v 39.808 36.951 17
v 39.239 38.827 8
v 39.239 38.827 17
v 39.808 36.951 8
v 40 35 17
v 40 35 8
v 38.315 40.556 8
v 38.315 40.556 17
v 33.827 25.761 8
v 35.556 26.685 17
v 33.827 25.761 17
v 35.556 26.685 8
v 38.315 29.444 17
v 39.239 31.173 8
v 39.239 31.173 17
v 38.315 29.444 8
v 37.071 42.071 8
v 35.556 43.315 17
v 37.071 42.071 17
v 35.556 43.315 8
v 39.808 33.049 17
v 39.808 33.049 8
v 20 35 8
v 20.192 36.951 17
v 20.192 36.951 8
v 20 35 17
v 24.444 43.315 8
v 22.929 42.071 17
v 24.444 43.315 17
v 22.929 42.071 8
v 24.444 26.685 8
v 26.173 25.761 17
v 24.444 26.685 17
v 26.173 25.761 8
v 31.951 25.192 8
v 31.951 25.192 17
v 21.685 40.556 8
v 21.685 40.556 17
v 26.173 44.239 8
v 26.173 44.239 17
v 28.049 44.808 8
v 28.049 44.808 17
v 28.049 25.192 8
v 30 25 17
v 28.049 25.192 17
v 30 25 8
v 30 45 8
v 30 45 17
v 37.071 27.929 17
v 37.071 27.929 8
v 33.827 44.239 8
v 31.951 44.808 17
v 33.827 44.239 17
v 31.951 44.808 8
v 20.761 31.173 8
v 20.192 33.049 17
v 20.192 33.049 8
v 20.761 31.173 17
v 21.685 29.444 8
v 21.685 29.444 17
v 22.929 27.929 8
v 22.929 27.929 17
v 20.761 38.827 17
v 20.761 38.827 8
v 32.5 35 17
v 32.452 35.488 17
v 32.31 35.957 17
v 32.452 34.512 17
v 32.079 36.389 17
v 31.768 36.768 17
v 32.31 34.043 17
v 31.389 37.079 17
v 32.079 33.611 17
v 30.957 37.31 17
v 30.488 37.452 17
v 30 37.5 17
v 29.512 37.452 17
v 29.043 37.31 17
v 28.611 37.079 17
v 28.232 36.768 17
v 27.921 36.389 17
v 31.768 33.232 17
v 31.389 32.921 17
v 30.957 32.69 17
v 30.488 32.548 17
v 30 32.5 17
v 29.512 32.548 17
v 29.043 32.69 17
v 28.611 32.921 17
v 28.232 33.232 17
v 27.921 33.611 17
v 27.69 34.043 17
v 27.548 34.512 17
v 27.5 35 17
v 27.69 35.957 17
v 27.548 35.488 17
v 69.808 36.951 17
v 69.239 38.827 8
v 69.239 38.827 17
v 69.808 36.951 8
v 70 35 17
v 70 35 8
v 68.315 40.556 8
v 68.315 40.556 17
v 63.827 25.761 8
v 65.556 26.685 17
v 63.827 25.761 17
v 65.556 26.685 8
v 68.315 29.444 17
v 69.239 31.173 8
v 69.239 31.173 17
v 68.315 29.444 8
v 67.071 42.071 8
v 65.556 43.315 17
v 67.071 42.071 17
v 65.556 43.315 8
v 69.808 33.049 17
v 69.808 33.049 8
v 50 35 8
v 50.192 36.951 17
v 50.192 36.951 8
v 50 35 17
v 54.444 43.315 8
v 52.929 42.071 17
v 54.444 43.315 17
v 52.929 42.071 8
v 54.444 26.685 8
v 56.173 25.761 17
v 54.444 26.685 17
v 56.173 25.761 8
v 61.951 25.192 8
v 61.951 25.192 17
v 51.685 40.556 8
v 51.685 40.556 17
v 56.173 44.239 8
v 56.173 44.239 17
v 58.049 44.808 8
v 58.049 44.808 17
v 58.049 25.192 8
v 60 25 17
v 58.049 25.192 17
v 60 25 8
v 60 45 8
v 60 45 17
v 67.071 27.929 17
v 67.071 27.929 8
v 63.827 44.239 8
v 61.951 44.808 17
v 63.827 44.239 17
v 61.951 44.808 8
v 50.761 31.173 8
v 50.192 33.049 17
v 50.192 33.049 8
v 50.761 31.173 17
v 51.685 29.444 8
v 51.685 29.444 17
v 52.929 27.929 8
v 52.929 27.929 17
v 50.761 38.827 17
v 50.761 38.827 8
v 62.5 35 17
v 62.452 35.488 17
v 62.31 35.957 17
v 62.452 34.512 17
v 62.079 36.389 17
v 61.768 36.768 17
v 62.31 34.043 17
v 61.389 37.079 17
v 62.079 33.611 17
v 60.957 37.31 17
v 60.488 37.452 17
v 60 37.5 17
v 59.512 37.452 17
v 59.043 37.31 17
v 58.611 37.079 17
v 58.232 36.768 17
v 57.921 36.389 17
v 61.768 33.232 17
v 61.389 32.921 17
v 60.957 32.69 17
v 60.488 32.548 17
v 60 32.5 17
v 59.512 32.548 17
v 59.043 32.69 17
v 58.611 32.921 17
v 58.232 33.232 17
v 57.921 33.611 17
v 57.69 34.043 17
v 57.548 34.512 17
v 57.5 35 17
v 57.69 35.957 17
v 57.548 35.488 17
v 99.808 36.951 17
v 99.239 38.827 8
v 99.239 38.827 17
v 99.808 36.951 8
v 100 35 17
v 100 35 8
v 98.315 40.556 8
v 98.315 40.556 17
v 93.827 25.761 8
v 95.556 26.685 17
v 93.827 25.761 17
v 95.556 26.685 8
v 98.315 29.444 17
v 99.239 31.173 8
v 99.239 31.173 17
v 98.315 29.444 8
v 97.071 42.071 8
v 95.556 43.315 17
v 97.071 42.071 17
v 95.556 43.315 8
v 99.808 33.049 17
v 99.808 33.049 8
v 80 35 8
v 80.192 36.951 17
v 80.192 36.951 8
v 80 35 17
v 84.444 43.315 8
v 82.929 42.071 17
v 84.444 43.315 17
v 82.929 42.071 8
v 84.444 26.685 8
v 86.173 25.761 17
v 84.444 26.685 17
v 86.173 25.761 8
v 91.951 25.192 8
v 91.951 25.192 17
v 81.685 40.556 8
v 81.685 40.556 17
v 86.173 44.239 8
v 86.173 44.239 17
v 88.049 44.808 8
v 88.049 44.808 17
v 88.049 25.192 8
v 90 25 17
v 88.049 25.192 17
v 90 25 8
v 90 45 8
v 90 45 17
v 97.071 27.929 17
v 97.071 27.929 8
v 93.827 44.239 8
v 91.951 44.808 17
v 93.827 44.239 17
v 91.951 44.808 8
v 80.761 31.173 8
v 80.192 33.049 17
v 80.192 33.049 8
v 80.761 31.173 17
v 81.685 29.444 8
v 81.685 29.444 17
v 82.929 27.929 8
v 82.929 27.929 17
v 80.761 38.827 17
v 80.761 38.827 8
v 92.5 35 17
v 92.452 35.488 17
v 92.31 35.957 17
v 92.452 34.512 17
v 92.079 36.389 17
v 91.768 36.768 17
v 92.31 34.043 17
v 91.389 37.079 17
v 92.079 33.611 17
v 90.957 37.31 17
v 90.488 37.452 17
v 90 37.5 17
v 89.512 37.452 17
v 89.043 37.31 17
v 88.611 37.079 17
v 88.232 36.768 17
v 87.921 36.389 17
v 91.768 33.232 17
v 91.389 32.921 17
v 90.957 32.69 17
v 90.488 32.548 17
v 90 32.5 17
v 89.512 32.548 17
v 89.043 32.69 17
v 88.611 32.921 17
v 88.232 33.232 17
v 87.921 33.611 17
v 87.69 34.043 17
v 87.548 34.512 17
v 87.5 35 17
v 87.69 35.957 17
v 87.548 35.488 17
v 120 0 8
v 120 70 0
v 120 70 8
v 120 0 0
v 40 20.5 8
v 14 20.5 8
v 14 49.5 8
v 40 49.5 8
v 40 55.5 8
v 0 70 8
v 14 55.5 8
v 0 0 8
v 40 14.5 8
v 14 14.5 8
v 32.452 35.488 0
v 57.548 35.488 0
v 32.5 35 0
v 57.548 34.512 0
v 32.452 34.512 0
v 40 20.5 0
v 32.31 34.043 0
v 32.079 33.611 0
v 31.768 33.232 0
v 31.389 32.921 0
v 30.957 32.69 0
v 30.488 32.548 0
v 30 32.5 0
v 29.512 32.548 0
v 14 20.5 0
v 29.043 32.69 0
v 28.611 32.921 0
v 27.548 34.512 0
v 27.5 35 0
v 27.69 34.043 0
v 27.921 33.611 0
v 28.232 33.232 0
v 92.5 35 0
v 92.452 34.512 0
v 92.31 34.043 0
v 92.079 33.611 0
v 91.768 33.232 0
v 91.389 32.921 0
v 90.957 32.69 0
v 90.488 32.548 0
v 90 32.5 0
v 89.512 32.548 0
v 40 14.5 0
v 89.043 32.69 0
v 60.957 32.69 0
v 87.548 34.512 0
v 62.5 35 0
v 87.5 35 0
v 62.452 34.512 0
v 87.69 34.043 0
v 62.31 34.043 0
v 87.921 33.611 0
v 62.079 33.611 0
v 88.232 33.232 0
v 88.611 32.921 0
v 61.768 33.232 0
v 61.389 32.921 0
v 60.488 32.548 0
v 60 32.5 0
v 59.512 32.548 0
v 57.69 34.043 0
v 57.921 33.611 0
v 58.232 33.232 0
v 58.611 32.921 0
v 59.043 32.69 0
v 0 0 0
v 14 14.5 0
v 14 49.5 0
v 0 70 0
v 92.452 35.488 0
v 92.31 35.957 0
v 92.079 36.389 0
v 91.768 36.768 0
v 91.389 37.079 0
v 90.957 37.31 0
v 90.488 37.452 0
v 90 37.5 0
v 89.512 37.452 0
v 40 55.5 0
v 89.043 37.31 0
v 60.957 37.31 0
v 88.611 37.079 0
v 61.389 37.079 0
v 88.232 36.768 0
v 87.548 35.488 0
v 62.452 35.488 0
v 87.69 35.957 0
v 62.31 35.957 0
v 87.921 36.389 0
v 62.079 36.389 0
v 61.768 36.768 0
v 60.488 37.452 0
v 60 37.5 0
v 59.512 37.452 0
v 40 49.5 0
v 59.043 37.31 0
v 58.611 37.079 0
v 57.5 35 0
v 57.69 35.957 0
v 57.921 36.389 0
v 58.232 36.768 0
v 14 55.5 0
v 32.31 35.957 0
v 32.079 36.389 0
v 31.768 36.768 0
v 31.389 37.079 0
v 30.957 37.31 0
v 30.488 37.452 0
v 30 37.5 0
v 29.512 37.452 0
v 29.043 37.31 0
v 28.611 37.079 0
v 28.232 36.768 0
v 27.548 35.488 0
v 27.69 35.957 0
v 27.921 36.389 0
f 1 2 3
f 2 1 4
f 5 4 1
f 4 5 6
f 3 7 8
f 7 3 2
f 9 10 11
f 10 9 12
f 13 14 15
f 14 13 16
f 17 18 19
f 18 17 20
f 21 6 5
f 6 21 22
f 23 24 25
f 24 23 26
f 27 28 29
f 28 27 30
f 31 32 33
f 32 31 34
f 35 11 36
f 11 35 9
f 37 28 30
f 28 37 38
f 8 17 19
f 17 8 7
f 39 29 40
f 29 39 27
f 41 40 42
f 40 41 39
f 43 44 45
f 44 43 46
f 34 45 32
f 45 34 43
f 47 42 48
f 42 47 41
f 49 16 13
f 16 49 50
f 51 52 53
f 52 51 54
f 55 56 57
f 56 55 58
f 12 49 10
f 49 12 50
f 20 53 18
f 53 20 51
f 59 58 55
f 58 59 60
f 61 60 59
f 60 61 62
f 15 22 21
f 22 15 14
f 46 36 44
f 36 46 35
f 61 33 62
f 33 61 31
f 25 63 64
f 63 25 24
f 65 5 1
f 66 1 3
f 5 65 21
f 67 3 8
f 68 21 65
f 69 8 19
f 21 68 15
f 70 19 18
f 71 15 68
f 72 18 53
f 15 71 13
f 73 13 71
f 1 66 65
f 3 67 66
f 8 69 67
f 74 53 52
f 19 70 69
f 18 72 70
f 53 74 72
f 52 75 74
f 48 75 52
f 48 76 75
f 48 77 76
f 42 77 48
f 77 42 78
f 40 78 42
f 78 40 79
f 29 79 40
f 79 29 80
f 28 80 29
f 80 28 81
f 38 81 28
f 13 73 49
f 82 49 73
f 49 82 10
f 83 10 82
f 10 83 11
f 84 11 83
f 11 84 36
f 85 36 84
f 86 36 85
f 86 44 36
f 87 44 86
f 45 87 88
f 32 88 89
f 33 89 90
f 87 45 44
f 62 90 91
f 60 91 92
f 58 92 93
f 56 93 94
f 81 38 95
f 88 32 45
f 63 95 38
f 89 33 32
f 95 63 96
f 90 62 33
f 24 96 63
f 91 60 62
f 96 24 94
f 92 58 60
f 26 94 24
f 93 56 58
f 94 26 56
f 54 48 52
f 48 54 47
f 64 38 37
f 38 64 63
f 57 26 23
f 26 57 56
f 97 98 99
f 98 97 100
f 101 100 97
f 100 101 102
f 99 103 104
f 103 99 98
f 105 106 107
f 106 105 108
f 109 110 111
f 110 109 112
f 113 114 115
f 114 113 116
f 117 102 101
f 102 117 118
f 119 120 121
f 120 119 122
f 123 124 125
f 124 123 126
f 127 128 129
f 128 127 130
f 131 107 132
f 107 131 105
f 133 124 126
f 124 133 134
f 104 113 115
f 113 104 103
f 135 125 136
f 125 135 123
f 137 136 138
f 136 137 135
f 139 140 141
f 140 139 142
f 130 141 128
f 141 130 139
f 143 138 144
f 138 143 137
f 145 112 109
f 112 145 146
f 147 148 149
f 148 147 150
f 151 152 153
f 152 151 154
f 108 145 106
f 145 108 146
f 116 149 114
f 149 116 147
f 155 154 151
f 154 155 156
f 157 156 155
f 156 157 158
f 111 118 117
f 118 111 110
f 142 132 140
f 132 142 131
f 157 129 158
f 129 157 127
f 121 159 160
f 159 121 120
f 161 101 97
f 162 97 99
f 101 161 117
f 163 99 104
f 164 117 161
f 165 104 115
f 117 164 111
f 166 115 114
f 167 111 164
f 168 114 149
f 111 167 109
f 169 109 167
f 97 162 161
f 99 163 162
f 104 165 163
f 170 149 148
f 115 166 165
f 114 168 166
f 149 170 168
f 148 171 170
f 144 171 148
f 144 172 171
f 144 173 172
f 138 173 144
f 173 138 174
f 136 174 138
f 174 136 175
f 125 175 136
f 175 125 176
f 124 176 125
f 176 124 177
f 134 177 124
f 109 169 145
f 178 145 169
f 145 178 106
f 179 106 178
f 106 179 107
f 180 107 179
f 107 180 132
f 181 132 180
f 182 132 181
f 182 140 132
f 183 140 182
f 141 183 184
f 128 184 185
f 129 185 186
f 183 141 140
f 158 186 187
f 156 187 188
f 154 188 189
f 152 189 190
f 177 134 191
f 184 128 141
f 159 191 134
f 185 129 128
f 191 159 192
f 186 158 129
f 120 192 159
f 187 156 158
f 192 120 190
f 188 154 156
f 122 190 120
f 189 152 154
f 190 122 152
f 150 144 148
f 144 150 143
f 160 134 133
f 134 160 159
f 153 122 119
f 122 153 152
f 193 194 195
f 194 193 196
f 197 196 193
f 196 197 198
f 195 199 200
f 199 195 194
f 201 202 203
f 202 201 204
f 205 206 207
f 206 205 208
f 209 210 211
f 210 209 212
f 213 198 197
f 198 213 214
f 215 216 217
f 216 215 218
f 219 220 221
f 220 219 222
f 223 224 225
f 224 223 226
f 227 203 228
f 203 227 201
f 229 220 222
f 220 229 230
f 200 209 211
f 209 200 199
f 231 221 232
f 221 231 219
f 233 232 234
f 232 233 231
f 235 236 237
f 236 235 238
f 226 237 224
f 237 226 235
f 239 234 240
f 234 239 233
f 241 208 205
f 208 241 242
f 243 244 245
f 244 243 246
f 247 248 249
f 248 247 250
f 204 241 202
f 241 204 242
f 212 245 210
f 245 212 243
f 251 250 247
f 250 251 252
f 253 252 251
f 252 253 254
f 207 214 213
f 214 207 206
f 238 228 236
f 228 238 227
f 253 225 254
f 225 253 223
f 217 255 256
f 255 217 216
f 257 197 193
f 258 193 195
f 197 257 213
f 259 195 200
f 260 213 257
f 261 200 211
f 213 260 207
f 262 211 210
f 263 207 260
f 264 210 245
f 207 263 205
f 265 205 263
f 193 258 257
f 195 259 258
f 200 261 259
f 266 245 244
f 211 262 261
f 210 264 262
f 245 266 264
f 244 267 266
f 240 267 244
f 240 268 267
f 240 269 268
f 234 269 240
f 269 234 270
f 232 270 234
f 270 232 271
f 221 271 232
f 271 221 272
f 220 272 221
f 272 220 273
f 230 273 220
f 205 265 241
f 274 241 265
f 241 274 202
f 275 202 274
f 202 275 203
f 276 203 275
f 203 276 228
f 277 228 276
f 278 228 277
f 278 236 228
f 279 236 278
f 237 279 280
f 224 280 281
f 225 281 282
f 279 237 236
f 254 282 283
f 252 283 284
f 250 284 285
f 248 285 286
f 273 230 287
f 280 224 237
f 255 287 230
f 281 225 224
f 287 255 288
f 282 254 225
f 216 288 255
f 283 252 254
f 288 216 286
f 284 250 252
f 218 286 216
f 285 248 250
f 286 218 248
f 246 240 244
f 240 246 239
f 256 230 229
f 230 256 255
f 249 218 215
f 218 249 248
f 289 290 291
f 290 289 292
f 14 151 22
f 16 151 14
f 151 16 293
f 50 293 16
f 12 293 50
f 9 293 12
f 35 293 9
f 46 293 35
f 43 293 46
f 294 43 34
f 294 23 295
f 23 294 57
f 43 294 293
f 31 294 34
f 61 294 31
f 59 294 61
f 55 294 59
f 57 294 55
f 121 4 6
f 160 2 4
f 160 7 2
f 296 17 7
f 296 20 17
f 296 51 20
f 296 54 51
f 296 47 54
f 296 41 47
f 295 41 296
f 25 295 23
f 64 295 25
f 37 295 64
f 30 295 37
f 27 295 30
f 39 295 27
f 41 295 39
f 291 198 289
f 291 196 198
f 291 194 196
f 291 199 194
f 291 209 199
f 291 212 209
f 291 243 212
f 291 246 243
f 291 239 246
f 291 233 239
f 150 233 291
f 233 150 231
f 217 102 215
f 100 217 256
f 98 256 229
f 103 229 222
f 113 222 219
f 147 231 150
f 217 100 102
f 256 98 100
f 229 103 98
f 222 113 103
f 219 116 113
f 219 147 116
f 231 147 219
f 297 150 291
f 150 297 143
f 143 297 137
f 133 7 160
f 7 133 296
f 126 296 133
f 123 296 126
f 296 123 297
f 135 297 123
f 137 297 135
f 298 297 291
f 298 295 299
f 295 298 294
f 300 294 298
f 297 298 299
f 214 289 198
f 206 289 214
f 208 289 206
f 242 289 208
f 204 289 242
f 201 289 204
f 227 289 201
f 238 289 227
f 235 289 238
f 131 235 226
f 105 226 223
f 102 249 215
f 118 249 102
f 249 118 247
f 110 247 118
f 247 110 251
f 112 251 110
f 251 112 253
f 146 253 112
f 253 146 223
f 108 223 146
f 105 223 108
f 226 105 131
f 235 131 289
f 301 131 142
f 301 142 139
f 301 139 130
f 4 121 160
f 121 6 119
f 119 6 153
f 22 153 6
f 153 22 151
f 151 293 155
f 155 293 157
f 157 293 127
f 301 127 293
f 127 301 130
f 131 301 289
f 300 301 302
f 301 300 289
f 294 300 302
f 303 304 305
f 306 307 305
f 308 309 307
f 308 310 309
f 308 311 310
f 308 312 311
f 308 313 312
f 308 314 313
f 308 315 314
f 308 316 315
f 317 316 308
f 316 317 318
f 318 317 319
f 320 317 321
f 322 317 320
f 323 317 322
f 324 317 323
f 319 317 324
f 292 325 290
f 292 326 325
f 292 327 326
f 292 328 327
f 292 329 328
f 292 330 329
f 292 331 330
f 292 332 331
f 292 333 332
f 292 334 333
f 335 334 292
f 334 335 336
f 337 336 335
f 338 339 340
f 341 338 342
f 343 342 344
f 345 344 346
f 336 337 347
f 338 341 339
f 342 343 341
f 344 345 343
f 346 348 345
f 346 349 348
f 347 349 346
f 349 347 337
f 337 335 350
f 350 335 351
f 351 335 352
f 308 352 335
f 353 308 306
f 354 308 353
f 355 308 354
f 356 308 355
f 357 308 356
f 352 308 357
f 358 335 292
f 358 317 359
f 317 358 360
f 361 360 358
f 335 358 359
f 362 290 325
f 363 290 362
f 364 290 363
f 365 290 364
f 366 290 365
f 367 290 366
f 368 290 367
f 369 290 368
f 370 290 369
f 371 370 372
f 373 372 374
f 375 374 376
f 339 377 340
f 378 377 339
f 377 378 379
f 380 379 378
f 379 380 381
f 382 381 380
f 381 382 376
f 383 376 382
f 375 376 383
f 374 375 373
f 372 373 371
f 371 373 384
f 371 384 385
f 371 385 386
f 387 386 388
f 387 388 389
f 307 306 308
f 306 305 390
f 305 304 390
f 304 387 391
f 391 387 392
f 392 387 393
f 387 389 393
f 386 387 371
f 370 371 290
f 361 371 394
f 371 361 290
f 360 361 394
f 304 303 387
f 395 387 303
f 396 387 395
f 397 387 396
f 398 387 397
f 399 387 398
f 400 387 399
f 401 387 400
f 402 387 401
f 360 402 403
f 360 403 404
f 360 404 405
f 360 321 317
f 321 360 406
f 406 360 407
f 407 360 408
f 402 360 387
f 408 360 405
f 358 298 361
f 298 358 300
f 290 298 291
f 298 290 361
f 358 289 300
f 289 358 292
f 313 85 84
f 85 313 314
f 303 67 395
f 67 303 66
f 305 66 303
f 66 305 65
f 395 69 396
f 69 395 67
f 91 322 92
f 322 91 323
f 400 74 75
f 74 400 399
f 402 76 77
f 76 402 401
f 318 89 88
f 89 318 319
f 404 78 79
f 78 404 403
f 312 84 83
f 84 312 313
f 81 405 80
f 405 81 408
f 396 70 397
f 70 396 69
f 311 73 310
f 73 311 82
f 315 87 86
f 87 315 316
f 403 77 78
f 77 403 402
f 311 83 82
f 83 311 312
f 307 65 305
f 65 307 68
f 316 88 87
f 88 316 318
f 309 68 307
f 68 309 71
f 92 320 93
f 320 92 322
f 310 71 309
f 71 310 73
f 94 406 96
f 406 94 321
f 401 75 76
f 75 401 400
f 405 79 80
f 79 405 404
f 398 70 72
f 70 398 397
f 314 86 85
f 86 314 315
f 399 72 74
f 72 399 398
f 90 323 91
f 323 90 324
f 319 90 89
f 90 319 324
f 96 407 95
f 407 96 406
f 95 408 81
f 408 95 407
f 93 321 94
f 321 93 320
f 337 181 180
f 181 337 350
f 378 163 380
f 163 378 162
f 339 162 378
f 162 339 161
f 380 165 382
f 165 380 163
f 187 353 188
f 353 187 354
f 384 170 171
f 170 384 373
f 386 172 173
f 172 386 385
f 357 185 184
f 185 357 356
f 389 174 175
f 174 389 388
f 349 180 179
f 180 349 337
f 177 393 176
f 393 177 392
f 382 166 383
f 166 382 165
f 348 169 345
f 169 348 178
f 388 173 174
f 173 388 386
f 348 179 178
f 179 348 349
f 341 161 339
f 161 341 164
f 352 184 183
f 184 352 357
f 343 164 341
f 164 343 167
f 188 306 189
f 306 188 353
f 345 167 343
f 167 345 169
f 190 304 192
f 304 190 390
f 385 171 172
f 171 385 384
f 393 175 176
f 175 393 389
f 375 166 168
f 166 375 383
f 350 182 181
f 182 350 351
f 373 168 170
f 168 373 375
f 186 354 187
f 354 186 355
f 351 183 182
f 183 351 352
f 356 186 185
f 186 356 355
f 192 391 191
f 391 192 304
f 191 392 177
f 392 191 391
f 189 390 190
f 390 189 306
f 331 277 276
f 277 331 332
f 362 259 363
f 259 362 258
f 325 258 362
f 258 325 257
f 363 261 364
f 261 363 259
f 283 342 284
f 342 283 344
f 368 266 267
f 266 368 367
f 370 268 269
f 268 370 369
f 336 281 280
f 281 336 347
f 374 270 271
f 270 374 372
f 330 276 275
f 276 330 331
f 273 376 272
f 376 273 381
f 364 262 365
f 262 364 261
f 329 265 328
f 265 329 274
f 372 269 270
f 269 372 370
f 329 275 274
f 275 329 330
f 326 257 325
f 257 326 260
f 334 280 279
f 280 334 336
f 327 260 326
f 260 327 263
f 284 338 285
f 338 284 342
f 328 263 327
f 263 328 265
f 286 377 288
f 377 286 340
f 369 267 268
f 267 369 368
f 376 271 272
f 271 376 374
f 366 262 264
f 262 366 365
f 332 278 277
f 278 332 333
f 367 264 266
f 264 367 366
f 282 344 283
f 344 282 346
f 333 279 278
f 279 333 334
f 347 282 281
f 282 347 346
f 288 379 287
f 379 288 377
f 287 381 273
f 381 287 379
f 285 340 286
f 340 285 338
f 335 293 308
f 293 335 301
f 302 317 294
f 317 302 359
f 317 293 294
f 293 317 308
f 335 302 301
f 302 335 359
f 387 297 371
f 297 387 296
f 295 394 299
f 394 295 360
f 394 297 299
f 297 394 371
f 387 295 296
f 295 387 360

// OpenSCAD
$fn = 32;

// ----------------------------------------------------------------------
// Drill jig: three_boss_slot jig
// ----------------------------------------------------------------------

// --- parameters (mm) ---
plate_l = 120;            // plate length, X
plate_w = 70;             // plate width, Y
plate_t = 8;              // plate thickness
boss_d = 20;              // guide boss diameter
boss_h = 10;              // boss height above the plate
guide_d = 5;              // guide hole diameter
boss_pitch = 30;          // boss pitch
slot_w = 6;               // clamp slot width
slot_l = 26;              // clamp slot length
slot_x = 14;              // slot start X

n_boss = 3;  // guide bosses
boss_x0 = (plate_l - (n_boss - 1) * boss_pitch) / 2;  // first boss X
boss_top = plate_t - 1 + boss_h;  // boss crown height
total_h = boss_top;  // overall height

difference() {
  union() {
  cube([plate_l, plate_w, plate_t]);
  for (i = [0 : n_boss - 1])
    translate([boss_x0 + i * boss_pitch, plate_w / 2, plate_t - 1])
      cylinder(h = boss_h, d = boss_d);
  }
  for (i = [0 : n_boss - 1])
    translate([boss_x0 + i * boss_pitch, plate_w / 2, -1])
      cylinder(h = plate_t + boss_h, d = guide_d);
  for (cy = [plate_w * 0.25, plate_w * 0.75])
    translate([slot_x, cy - slot_w / 2, -1])
      cube([slot_l, slot_w, plate_t + 2]);
}
